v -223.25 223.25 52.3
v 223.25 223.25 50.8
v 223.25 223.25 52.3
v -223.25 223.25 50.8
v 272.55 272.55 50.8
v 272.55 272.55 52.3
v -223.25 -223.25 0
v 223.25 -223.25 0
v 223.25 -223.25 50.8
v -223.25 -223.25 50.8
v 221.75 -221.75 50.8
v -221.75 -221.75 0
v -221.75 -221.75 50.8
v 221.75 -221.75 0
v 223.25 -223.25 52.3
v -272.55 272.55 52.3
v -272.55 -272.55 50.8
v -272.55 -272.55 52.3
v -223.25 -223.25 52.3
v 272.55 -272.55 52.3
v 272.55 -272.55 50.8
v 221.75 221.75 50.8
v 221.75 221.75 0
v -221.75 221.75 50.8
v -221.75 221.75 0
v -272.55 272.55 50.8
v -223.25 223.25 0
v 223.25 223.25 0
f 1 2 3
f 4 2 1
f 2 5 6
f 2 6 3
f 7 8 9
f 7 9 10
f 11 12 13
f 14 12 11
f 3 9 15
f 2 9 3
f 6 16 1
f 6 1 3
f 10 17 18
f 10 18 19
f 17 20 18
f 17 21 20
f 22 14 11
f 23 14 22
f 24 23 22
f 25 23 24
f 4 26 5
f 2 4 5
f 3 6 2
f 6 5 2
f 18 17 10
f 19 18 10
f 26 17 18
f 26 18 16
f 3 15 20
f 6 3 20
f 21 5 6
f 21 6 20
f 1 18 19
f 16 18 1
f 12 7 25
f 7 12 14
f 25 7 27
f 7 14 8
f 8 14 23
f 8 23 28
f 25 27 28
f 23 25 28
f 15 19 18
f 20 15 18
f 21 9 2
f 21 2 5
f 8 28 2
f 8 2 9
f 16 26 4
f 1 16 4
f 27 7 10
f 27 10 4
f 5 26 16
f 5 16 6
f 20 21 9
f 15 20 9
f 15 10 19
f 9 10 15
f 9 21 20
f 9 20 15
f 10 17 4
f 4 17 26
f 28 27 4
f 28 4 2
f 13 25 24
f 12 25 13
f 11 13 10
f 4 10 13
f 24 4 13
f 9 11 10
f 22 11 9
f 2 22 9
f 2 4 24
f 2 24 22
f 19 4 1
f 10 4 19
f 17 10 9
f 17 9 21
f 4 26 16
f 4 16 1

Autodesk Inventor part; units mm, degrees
ref_plane "YZ Plane" through (0, 0, 0) normal (1, 0, 0) x (0, 1, 0)
ref_plane "XZ Plane" through (0, 0, 0) normal (0, 1, 0) x (-1, 0, 0)
ref_plane "XY Plane" through (0, 0, 0) normal (0, 0, 1) x (1, 0, 0)
sketch "Sketch1" plane through (0, 0, 0) normal (0, 0, 1) x (1, 0, 0)
  line L0 (-221.75, -221.75) -> (221.75, -221.75)
  line L1 (221.75, -221.75) -> (221.75, 221.75)
  line L2 (221.75, 221.75) -> (-221.75, 221.75)
  line L3 (-221.75, 221.75) -> (-221.75, -221.75)
  line L4 (-221.75, -221.75) -> (221.75, 221.75) construction
  line L5 (221.75, -221.75) -> (-221.75, 221.75) construction
  line L6 (-223.25, 223.25) -> (223.25, 223.25)
  line L7 (223.25, 223.25) -> (223.25, -223.25)
  line L8 (223.25, -223.25) -> (-223.25, -223.25)
  line L9 (-223.25, -223.25) -> (-223.25, 223.25)
  point P0 (0, 0)
  dimension "d0" = 443.5
  dimension "d1" = 443.5
  dimension "d2" = 1.5
extrude "Extrusion1" add sketch "Sketch1" along normal blind 50.8
sketch "Sketch2" plane through (0, 0, 50.8) normal (0, 0, 1) x (1, 0, 0)
  line L0 (272.55, -272.55) -> (-272.55, -272.55)
  line L1 (-272.55, -272.55) -> (-272.55, 272.55)
  line L2 (-272.55, 272.55) -> (272.55, 272.55)
  line L3 (272.55, 272.55) -> (272.55, -272.55)
  line L4 (272.55, -272.55) -> (-272.55, 272.55) construction
  line L5 (-272.55, -272.55) -> (272.55, 272.55) construction
  line L6 (223.25, 223.25) -> (-223.25, 223.25) projected
  line L7 (-272.55, 272.55) -> (-223.25, 223.25)
  line L8 (-223.25, 223.25) -> (-223.25, -223.25) projected
  line L9 (-272.55, -272.55) -> (-223.25, -223.25)
  line L10 (-223.25, -223.25) -> (223.25, -223.25) projected
  line L11 (272.55, -272.55) -> (223.25, -223.25)
  line L12 (272.55, 272.55) -> (223.25, 223.25)
  line L13 (223.25, -223.25) -> (223.25, 223.25) projected
  point P0 (0, 0)
  dimension "d5" = 545.1
  dimension "d6" = 545.1
extrude "Extrusion2" add sketch "Sketch2" along normal blind 1.5 separate body contours L12 L6 L7 L2
extrude "Extrusion3" add sketch "Sketch2" along normal blind 1.5 separate body contours L11 L13 L12 L3
extrude "Extrusion4" add sketch "Sketch2" along normal blind 1.5 separate body contours L0 L9 L10 L11
extrude "Extrusion5" add sketch "Sketch2" along normal blind 1.5 separate body contours L1 L7 L8 L9
sketch "Sketch3" plane through (0, 0, 0) normal (0, 0, -1) x (-1, 0, 0)
  line L0 (-223.25, 223.25) -> (223.25, 223.25) projected
  line L1 (-223.25, -223.25) -> (-223.25, 223.25) projected
  line L2 (223.25, 223.25) -> (223.25, -223.25) projected
  line L3 (223.25, -223.25) -> (-223.25, -223.25) projected
  point P0 (0, 0)
properties part number "Test Section Frame"
